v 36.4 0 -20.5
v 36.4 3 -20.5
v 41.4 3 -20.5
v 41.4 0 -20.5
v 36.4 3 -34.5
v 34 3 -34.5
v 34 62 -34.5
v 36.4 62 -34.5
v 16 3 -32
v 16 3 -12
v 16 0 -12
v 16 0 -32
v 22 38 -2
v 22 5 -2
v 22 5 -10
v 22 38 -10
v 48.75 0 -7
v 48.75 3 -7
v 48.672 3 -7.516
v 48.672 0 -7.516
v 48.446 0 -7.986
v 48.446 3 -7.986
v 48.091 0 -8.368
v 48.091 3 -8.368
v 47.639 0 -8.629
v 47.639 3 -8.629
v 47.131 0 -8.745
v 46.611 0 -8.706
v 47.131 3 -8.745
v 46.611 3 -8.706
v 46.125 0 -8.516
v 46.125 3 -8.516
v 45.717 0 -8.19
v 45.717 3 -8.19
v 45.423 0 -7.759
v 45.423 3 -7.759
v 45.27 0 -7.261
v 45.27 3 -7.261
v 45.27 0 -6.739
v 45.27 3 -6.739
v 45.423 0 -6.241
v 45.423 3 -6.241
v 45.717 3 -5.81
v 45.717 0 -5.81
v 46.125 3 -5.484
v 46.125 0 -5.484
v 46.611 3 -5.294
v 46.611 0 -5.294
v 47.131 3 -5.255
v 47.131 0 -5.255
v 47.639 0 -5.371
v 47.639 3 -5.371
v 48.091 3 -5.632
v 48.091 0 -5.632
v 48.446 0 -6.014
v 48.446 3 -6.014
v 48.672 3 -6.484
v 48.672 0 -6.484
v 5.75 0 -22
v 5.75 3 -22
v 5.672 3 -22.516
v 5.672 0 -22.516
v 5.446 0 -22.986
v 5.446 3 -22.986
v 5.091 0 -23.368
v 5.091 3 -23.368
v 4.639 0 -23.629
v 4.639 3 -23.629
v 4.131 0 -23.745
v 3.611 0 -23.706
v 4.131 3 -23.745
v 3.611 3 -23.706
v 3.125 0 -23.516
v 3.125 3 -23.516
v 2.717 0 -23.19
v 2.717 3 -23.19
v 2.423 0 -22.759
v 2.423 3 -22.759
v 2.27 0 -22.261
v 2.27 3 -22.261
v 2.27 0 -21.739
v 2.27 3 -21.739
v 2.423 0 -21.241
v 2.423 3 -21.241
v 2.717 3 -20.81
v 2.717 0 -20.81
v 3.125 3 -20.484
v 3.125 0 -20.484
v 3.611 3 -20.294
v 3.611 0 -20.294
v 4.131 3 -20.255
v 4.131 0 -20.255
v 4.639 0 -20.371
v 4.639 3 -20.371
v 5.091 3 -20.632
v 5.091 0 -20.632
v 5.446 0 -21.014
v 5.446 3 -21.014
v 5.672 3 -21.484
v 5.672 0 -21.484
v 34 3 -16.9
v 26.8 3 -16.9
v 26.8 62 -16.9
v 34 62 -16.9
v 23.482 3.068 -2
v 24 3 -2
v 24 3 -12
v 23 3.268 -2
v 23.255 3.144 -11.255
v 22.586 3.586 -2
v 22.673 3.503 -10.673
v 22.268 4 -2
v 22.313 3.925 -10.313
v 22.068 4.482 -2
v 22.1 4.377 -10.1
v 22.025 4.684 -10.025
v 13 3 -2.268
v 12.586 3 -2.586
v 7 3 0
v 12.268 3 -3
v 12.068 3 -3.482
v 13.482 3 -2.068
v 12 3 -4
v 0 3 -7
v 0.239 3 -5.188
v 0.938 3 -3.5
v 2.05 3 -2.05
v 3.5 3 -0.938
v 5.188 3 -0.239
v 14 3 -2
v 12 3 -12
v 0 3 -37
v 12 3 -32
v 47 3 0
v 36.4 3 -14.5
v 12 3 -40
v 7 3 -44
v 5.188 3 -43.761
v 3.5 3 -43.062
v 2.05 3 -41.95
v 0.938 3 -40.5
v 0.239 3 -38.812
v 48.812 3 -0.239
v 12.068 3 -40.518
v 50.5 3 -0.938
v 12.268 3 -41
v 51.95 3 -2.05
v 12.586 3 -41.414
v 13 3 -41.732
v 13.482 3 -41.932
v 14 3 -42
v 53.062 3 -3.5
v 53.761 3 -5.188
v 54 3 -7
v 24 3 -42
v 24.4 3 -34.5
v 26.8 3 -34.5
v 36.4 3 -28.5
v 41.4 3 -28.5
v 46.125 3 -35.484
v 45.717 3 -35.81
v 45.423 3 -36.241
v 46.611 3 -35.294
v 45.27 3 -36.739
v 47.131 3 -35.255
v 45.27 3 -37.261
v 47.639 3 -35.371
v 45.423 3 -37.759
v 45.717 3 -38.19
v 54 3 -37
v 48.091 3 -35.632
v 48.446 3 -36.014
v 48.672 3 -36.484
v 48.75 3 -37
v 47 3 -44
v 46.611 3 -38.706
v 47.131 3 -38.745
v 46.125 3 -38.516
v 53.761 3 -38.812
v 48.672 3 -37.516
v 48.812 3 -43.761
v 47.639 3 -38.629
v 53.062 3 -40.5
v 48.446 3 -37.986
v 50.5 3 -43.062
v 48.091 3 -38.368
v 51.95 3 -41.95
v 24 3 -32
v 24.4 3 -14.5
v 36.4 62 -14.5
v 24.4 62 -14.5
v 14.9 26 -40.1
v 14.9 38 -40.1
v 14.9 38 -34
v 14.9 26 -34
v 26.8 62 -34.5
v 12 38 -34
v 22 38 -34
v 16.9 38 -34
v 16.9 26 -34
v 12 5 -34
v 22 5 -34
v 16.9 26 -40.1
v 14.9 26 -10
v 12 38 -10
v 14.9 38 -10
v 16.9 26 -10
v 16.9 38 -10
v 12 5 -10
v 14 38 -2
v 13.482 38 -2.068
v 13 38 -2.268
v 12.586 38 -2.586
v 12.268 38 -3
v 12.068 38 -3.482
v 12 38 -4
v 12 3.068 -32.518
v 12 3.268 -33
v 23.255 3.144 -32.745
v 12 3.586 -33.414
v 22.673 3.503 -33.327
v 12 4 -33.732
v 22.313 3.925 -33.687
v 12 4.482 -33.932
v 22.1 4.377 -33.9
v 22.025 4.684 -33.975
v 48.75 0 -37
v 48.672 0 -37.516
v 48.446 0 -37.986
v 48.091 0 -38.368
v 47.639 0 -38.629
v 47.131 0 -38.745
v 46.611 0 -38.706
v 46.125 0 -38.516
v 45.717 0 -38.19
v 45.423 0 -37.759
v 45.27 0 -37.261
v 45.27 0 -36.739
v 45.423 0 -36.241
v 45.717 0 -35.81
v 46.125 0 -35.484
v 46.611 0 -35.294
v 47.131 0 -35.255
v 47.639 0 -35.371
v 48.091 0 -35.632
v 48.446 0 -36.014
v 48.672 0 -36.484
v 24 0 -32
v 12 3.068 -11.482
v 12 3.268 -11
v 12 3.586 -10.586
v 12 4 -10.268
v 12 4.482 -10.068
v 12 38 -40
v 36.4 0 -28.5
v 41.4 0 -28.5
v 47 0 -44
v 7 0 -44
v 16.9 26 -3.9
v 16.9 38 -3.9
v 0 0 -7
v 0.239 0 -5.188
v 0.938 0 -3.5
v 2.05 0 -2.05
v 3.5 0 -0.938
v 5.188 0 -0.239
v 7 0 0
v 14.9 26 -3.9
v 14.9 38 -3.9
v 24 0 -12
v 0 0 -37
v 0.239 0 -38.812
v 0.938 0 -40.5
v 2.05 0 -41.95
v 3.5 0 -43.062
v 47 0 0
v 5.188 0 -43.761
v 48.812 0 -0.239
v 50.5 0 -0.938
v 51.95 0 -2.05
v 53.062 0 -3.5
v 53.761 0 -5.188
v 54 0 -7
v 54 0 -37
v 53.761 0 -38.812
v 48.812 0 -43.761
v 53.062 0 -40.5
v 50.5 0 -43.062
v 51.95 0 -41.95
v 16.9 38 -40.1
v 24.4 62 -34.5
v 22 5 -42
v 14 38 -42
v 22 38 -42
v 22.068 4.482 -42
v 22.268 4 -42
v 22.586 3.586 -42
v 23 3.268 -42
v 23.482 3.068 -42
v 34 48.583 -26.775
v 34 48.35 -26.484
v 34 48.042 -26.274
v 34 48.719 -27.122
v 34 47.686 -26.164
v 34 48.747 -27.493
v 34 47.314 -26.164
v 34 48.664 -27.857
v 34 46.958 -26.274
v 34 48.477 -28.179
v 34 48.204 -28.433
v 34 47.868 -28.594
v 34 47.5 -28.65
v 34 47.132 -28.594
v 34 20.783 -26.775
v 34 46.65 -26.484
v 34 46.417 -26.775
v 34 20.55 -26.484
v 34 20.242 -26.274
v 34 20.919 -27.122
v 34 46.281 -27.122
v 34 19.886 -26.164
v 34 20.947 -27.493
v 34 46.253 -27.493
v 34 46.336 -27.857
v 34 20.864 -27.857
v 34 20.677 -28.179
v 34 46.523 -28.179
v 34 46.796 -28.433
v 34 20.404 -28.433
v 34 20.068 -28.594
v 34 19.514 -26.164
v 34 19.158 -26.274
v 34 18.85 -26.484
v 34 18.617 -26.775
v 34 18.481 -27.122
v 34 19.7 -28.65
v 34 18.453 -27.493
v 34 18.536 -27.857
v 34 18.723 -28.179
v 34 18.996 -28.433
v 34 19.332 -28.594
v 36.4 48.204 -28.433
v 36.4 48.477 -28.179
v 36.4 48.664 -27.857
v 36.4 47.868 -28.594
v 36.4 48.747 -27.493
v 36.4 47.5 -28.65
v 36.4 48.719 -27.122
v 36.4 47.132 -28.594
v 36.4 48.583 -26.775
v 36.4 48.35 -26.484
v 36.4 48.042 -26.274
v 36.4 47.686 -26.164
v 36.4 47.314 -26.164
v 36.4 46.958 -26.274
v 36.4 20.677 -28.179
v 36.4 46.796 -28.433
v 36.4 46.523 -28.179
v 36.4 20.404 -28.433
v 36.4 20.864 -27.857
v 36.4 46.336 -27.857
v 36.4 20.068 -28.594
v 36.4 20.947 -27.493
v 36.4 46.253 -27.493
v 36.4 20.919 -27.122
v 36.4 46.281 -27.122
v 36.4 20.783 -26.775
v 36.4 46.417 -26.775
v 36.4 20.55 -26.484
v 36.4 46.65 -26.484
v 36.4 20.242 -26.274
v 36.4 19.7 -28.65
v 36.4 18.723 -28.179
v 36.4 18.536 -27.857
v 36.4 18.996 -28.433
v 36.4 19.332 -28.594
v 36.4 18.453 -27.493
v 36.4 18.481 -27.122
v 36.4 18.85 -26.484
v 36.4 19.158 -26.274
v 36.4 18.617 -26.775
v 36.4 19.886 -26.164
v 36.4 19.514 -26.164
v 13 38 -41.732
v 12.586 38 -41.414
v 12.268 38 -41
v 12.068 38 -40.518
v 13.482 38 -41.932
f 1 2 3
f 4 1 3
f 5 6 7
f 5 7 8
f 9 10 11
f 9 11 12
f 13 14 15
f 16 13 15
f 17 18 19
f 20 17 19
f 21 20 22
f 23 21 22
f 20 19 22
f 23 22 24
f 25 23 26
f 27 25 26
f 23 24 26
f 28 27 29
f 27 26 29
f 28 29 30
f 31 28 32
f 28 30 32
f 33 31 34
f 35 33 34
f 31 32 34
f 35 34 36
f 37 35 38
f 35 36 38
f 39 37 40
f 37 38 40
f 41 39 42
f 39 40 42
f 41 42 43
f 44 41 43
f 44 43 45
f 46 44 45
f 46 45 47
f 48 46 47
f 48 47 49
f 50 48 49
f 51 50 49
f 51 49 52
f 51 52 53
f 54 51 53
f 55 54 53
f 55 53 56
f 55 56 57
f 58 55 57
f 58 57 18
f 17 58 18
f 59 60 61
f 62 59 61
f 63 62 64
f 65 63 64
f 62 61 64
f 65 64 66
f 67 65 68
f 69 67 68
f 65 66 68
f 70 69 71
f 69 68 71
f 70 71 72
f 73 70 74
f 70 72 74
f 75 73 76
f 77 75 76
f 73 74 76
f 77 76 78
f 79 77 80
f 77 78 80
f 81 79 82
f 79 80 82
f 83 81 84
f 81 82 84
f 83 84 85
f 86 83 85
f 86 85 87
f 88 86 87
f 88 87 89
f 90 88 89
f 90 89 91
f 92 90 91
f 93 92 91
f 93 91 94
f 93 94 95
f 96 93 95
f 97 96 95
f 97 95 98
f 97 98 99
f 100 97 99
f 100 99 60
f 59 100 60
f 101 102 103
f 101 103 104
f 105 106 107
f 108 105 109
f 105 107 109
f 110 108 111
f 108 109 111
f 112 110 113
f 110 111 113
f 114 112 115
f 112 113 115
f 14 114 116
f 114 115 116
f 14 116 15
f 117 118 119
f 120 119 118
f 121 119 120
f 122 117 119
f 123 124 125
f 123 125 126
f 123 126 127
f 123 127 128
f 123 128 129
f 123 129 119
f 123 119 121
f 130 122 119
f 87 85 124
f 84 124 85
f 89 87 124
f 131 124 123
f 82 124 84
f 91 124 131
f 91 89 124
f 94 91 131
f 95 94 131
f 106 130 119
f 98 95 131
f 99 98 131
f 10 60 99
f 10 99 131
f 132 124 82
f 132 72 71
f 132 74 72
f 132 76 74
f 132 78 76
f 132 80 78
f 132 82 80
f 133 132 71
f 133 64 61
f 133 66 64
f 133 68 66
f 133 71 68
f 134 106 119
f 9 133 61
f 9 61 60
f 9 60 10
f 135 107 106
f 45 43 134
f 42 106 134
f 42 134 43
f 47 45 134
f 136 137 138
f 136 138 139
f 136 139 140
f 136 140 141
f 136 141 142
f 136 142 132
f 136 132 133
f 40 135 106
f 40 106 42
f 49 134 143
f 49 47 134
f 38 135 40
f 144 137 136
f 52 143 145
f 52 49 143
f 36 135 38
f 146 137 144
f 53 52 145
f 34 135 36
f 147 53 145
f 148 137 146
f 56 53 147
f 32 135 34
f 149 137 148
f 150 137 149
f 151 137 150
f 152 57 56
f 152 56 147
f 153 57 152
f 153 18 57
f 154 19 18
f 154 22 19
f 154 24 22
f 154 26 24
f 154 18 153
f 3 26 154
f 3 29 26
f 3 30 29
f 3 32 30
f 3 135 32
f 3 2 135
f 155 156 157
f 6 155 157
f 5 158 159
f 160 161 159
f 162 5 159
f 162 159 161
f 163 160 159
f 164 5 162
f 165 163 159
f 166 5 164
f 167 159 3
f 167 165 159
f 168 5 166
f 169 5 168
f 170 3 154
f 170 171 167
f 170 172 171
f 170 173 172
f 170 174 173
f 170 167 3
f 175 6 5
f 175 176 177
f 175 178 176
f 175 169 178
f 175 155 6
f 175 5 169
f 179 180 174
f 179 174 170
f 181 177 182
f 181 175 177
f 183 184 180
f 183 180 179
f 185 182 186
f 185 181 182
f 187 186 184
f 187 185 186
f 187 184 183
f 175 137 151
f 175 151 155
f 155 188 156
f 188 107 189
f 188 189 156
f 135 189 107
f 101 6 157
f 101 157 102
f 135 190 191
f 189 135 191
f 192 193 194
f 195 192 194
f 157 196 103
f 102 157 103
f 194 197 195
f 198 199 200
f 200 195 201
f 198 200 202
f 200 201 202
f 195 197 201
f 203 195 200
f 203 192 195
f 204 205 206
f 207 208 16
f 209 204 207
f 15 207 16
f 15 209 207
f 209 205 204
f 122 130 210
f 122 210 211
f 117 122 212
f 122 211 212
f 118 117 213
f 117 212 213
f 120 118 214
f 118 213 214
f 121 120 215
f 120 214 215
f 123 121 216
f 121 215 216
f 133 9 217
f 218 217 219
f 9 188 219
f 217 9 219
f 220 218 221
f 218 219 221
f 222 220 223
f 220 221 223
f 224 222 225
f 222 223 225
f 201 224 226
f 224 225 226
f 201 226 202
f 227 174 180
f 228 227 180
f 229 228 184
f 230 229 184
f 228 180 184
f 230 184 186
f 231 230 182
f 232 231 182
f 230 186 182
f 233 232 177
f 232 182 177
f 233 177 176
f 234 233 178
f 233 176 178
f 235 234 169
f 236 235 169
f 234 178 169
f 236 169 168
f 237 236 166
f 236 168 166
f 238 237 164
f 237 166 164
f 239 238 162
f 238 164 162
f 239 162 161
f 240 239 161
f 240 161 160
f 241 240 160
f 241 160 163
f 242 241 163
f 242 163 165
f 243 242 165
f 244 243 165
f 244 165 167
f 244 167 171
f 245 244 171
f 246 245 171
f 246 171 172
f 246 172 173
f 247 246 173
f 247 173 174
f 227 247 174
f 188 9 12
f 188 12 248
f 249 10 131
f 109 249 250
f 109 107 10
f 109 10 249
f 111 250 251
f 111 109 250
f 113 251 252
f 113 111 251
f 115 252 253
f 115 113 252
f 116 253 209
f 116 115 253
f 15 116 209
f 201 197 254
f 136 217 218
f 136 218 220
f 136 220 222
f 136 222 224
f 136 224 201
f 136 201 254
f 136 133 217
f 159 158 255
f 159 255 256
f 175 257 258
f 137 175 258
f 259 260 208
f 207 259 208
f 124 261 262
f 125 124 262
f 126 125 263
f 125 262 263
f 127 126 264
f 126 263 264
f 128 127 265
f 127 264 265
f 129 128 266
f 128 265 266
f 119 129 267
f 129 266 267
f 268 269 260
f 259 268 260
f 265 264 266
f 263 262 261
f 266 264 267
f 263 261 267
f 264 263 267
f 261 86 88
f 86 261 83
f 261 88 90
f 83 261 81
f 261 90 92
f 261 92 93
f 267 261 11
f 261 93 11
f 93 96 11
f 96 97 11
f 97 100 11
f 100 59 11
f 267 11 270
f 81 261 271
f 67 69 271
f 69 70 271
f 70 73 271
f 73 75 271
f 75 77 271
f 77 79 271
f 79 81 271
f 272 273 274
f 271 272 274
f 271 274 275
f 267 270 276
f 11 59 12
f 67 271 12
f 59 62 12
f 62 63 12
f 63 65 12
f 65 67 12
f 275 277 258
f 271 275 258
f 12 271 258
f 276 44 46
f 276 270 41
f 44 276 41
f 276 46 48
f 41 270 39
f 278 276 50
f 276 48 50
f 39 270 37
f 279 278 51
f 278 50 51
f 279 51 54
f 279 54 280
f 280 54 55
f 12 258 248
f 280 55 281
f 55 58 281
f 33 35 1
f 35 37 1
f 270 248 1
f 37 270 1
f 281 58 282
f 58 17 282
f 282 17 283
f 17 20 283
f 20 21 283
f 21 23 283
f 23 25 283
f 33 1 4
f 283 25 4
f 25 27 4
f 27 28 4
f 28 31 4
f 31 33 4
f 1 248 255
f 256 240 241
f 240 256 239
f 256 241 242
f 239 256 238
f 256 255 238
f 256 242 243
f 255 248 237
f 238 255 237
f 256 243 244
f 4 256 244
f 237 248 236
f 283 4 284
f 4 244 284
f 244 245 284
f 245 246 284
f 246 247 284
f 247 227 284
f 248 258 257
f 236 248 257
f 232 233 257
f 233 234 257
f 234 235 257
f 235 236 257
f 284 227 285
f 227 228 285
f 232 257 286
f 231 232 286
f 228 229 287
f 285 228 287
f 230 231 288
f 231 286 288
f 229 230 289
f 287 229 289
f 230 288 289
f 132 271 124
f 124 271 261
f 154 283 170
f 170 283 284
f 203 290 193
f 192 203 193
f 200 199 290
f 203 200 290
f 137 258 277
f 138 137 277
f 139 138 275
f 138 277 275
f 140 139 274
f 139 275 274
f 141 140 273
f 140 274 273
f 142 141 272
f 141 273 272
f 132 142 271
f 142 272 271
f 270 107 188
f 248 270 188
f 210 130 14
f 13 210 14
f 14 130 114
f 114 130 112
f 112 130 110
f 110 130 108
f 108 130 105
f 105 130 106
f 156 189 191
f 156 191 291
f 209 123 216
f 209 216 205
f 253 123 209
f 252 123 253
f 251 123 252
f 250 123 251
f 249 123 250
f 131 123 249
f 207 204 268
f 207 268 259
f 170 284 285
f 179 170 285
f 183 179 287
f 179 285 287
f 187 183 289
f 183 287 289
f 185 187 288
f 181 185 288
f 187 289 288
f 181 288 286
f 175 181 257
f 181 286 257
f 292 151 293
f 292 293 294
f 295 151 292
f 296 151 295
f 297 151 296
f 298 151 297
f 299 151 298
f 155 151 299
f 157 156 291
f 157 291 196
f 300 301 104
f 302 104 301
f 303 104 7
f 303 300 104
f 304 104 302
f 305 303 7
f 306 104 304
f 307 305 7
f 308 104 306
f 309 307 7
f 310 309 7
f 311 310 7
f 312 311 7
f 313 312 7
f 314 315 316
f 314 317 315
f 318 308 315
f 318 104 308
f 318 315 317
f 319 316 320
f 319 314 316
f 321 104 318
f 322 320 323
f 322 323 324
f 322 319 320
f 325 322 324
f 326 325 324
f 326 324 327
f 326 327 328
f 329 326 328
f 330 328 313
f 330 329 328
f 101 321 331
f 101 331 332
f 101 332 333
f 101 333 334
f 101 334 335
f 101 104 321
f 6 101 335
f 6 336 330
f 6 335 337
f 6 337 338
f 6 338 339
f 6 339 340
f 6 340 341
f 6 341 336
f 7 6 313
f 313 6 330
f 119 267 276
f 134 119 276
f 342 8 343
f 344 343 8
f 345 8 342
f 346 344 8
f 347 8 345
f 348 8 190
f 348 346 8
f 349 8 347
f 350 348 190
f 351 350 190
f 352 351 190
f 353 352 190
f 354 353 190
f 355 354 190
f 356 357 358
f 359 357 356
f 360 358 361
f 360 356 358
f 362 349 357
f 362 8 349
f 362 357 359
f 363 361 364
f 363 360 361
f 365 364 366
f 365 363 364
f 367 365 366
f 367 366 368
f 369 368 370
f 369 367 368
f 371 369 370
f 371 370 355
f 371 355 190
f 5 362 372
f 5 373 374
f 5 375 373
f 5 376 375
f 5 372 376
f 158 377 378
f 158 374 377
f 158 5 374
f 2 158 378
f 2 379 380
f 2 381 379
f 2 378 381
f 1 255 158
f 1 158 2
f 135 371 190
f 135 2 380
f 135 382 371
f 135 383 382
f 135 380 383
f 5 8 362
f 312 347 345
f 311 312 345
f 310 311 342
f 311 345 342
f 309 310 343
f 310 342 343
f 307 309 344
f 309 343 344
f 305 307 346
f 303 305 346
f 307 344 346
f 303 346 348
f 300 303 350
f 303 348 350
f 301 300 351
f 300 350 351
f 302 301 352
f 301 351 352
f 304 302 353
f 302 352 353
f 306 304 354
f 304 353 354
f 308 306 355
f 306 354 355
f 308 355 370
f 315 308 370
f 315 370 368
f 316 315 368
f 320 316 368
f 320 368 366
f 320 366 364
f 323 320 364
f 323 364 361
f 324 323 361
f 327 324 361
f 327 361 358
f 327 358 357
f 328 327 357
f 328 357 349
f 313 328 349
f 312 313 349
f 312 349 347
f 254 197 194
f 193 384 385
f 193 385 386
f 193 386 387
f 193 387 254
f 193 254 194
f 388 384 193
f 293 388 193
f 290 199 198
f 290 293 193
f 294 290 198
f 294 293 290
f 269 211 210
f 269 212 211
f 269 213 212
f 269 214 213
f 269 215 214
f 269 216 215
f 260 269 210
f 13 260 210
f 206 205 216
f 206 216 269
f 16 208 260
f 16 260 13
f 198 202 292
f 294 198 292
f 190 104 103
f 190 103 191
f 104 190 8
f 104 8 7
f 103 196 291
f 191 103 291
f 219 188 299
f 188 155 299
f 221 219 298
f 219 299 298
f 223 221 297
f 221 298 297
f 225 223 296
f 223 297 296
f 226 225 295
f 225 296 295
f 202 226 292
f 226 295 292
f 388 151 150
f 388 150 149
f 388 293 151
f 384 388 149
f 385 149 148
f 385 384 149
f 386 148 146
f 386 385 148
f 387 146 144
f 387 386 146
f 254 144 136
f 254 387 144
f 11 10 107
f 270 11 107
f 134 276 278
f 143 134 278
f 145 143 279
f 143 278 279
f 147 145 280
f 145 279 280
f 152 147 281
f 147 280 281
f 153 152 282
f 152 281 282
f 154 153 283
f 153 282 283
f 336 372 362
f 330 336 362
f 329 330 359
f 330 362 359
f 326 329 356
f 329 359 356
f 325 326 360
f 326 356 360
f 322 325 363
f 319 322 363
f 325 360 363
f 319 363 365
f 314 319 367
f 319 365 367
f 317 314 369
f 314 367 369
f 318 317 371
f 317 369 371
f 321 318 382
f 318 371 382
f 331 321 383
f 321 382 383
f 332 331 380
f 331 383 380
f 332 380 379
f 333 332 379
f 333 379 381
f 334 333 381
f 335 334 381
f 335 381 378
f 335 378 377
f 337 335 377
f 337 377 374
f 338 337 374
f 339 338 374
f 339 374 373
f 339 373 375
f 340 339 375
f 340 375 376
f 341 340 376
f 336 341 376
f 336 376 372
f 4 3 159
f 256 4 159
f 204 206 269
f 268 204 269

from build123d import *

# Parameters (mm, degrees)
SALIENTE_EXTRUIR1_DEPTH = 3
CORTAR_EXTRUIR1_REACH   = 5
CROQUIS2_W              = 5
CROQUIS2_H              = 8
CROQUIS3_W              = 10
CROQUIS3_H              = 8
SALIENTE_EXTRUIR2_DEPTH = 35
CORTAR_EXTRUIR2_DEPTH   = 12
REDONDEO1_R             = 2
REDONDEO2_R             = 2
SALIENTE_EXTRUIR3_DEPTH = 59
CORTAR_EXTRUIR3_REACH   = 38.4
CROQUIS6_R              = 1.25
CORTAR_EXTRUIR4_REACH   = 5
CROQUIS7_R              = 1.75
CROQUIS7_W              = 8
CROQUIS7_H              = 20


with BuildPart() as part:
    # Croquis1 → Saliente-Extruir1 (new body)
    with BuildSketch(Plane(origin=(0, 0, 0), x_dir=(1, 0, 0), z_dir=(0, 1, 0))):
        with BuildLine():
            Line((7, 0), (47, 0))
            ThreePointArc((47, 0), (51.949747468, 2.050252532), (54, 7))
            Line((54, 7), (54, 37))
            ThreePointArc((54, 37), (51.949747468, 41.949747468), (47, 44))
            Line((47, 44), (7, 44))
            ThreePointArc((7, 44), (2.050252532, 41.949747468), (0, 37))
            Line((0, 37), (0, 7))
            ThreePointArc((0, 7), (2.050252532, 2.050252532), (7, 0))
        make_face()
    extrude(amount=SALIENTE_EXTRUIR1_DEPTH)

    # Croquis2 → Cortar-Extruir1 (cut, up to next)
    with BuildSketch(Plane(origin=(0, 3, 0), x_dir=(1, 0, 0), z_dir=(0, 1, 0)), mode=Mode.PRIVATE) as cortar_extruir1_sk1:
        with Locations((38.9, 24.5)):
            Rectangle(CROQUIS2_W, CROQUIS2_H)
    cortar_extruir1_tool1 = extrude(cortar_extruir1_sk1.sketch, amount=-CORTAR_EXTRUIR1_REACH, mode=Mode.PRIVATE) & part.part
    add(cortar_extruir1_tool1.solids().sort_by_distance((38.9, 3, -24.5))[0], mode=Mode.SUBTRACT)

    # Croquis3 → Saliente-Extruir2 (add)
    with BuildSketch(Plane(origin=(0, 3, 0), x_dir=(1, 0, 0), z_dir=(0, 1, 0))):
        with Locations((17, 38)):
            Rectangle(CROQUIS3_W, CROQUIS3_H)
        with Locations((17, 6)):
            Rectangle(CROQUIS3_W, CROQUIS3_H)
    extrude(amount=SALIENTE_EXTRUIR2_DEPTH)

    # Croquis4 → Cortar-Extruir2 (cut)
    with BuildSketch(Plane(origin=(0, 38, 0), x_dir=(1, 0, 0), z_dir=(0, 1, 0))):
        with BuildLine():
            Line((14.9, 10.594122727), (14.9, 3.9))
            Line((14.9, 3.9), (16.9, 3.9))
            Line((16.9, 3.9), (16.9, 10.101282262))
            ThreePointArc((16.9, 10.101282262), (15.866874644, 10.213276209), (14.9, 10.594122727))
        make_face()
        with BuildLine():
            Line((16.9, 17.898717738), (16.9, 40.1))
            Line((16.9, 40.1), (14.9, 40.1))
            Line((14.9, 40.1), (14.9, 17.405877273))
            ThreePointArc((14.9, 17.405877273), (15.866874644, 17.786723791), (16.9, 17.898717738))
        make_face()
    extrude(amount=-CORTAR_EXTRUIR2_DEPTH, mode=Mode.SUBTRACT)

    # Redondeo1
    redondeo1_edges = [part.edges().sort_by_distance(p)[0] for p in [
        (12, 20.5, -42),
        (12, 20.5, -2),
    ]]
    fillet(redondeo1_edges, radius=REDONDEO1_R)

    # Redondeo2
    redondeo2_edges = [part.edges().sort_by_distance(p)[0] for p in [
        (17, 3, -34),
        (22, 3, -38),
        (22, 3, -6),
        (17, 3, -10),
    ]]
    fillet(redondeo2_edges, radius=REDONDEO2_R)

    # Croquis5 → Saliente-Extruir3 (add)
    with BuildSketch(Plane(origin=(0, 3, 0), x_dir=(1, 0, 0), z_dir=(0, 1, 0))):
        Polygon((36.4, 34.5), (36.4, 14.5), (24.4, 14.5), (24.4, 34.5), (26.8, 34.5), (26.8, 16.9), (34, 16.9), (34, 34.5), align=None)
    extrude(amount=SALIENTE_EXTRUIR3_DEPTH)

    # Croquis6 → Cortar-Extruir3 (cut, up to next)
    with BuildSketch(Plane(origin=(36.4, 0, 0), x_dir=(0, 0, -1), z_dir=(1, 0, 0)), mode=Mode.PRIVATE) as cortar_extruir3_sk1:
        with Locations((27.4, 47.5)):
            Circle(CROQUIS6_R)
    cortar_extruir3_tool1 = extrude(cortar_extruir3_sk1.sketch, amount=-CORTAR_EXTRUIR3_REACH, mode=Mode.PRIVATE) & part.part
    add(cortar_extruir3_tool1.solids().sort_by_distance((36.4, 47.5, -27.4))[0], mode=Mode.SUBTRACT)
    # Croquis6 → Cortar-Extruir3 (cut, up to next)
    with BuildSketch(Plane(origin=(36.4, 0, 0), x_dir=(0, 0, -1), z_dir=(1, 0, 0)), mode=Mode.PRIVATE) as cortar_extruir3_sk2:
        with Locations((27.4, 19.7)):
            Circle(CROQUIS6_R)
    cortar_extruir3_tool2 = extrude(cortar_extruir3_sk2.sketch, amount=-CORTAR_EXTRUIR3_REACH, mode=Mode.PRIVATE) & part.part
    add(cortar_extruir3_tool2.solids().sort_by_distance((36.4, 19.7, -27.4))[0], mode=Mode.SUBTRACT)

    # Croquis7 → Cortar-Extruir4 (cut, up to next)
    with BuildSketch(Plane(origin=(0, 3, 0), x_dir=(1, 0, 0), z_dir=(0, 1, 0)), mode=Mode.PRIVATE) as cortar_extruir4_sk1:
        with Locations((4, 22)):
            Circle(CROQUIS7_R)
    cortar_extruir4_tool1 = extrude(cortar_extruir4_sk1.sketch, amount=-CORTAR_EXTRUIR4_REACH, mode=Mode.PRIVATE) & part.part
    add(cortar_extruir4_tool1.solids().sort_by_distance((4, 3, -22))[0], mode=Mode.SUBTRACT)
    # Croquis7 → Cortar-Extruir4 (cut, up to next)
    with BuildSketch(Plane(origin=(0, 3, 0), x_dir=(1, 0, 0), z_dir=(0, 1, 0)), mode=Mode.PRIVATE) as cortar_extruir4_sk2:
        with Locations((47, 37)):
            Circle(CROQUIS7_R)
    cortar_extruir4_tool2 = extrude(cortar_extruir4_sk2.sketch, amount=-CORTAR_EXTRUIR4_REACH, mode=Mode.PRIVATE) & part.part
    add(cortar_extruir4_tool2.solids().sort_by_distance((47, 3, -37))[0], mode=Mode.SUBTRACT)
    # Croquis7 → Cortar-Extruir4 (cut, up to next)
    with BuildSketch(Plane(origin=(0, 3, 0), x_dir=(1, 0, 0), z_dir=(0, 1, 0)), mode=Mode.PRIVATE) as cortar_extruir4_sk3:
        with Locations((47, 7)):
            Circle(CROQUIS7_R)
    cortar_extruir4_tool3 = extrude(cortar_extruir4_sk3.sketch, amount=-CORTAR_EXTRUIR4_REACH, mode=Mode.PRIVATE) & part.part
    add(cortar_extruir4_tool3.solids().sort_by_distance((47, 3, -7))[0], mode=Mode.SUBTRACT)
    # Croquis7 → Cortar-Extruir4 (cut, up to next)
    with BuildSketch(Plane(origin=(0, 3, 0), x_dir=(1, 0, 0), z_dir=(0, 1, 0)), mode=Mode.PRIVATE) as cortar_extruir4_sk4:
        with Locations((20, 22)):
            Rectangle(CROQUIS7_W, CROQUIS7_H)
    cortar_extruir4_tool4 = extrude(cortar_extruir4_sk4.sketch, amount=-CORTAR_EXTRUIR4_REACH, mode=Mode.PRIVATE) & part.part
    add(cortar_extruir4_tool4.solids().sort_by_distance((20, 3, -22))[0], mode=Mode.SUBTRACT)


solid = part.part
